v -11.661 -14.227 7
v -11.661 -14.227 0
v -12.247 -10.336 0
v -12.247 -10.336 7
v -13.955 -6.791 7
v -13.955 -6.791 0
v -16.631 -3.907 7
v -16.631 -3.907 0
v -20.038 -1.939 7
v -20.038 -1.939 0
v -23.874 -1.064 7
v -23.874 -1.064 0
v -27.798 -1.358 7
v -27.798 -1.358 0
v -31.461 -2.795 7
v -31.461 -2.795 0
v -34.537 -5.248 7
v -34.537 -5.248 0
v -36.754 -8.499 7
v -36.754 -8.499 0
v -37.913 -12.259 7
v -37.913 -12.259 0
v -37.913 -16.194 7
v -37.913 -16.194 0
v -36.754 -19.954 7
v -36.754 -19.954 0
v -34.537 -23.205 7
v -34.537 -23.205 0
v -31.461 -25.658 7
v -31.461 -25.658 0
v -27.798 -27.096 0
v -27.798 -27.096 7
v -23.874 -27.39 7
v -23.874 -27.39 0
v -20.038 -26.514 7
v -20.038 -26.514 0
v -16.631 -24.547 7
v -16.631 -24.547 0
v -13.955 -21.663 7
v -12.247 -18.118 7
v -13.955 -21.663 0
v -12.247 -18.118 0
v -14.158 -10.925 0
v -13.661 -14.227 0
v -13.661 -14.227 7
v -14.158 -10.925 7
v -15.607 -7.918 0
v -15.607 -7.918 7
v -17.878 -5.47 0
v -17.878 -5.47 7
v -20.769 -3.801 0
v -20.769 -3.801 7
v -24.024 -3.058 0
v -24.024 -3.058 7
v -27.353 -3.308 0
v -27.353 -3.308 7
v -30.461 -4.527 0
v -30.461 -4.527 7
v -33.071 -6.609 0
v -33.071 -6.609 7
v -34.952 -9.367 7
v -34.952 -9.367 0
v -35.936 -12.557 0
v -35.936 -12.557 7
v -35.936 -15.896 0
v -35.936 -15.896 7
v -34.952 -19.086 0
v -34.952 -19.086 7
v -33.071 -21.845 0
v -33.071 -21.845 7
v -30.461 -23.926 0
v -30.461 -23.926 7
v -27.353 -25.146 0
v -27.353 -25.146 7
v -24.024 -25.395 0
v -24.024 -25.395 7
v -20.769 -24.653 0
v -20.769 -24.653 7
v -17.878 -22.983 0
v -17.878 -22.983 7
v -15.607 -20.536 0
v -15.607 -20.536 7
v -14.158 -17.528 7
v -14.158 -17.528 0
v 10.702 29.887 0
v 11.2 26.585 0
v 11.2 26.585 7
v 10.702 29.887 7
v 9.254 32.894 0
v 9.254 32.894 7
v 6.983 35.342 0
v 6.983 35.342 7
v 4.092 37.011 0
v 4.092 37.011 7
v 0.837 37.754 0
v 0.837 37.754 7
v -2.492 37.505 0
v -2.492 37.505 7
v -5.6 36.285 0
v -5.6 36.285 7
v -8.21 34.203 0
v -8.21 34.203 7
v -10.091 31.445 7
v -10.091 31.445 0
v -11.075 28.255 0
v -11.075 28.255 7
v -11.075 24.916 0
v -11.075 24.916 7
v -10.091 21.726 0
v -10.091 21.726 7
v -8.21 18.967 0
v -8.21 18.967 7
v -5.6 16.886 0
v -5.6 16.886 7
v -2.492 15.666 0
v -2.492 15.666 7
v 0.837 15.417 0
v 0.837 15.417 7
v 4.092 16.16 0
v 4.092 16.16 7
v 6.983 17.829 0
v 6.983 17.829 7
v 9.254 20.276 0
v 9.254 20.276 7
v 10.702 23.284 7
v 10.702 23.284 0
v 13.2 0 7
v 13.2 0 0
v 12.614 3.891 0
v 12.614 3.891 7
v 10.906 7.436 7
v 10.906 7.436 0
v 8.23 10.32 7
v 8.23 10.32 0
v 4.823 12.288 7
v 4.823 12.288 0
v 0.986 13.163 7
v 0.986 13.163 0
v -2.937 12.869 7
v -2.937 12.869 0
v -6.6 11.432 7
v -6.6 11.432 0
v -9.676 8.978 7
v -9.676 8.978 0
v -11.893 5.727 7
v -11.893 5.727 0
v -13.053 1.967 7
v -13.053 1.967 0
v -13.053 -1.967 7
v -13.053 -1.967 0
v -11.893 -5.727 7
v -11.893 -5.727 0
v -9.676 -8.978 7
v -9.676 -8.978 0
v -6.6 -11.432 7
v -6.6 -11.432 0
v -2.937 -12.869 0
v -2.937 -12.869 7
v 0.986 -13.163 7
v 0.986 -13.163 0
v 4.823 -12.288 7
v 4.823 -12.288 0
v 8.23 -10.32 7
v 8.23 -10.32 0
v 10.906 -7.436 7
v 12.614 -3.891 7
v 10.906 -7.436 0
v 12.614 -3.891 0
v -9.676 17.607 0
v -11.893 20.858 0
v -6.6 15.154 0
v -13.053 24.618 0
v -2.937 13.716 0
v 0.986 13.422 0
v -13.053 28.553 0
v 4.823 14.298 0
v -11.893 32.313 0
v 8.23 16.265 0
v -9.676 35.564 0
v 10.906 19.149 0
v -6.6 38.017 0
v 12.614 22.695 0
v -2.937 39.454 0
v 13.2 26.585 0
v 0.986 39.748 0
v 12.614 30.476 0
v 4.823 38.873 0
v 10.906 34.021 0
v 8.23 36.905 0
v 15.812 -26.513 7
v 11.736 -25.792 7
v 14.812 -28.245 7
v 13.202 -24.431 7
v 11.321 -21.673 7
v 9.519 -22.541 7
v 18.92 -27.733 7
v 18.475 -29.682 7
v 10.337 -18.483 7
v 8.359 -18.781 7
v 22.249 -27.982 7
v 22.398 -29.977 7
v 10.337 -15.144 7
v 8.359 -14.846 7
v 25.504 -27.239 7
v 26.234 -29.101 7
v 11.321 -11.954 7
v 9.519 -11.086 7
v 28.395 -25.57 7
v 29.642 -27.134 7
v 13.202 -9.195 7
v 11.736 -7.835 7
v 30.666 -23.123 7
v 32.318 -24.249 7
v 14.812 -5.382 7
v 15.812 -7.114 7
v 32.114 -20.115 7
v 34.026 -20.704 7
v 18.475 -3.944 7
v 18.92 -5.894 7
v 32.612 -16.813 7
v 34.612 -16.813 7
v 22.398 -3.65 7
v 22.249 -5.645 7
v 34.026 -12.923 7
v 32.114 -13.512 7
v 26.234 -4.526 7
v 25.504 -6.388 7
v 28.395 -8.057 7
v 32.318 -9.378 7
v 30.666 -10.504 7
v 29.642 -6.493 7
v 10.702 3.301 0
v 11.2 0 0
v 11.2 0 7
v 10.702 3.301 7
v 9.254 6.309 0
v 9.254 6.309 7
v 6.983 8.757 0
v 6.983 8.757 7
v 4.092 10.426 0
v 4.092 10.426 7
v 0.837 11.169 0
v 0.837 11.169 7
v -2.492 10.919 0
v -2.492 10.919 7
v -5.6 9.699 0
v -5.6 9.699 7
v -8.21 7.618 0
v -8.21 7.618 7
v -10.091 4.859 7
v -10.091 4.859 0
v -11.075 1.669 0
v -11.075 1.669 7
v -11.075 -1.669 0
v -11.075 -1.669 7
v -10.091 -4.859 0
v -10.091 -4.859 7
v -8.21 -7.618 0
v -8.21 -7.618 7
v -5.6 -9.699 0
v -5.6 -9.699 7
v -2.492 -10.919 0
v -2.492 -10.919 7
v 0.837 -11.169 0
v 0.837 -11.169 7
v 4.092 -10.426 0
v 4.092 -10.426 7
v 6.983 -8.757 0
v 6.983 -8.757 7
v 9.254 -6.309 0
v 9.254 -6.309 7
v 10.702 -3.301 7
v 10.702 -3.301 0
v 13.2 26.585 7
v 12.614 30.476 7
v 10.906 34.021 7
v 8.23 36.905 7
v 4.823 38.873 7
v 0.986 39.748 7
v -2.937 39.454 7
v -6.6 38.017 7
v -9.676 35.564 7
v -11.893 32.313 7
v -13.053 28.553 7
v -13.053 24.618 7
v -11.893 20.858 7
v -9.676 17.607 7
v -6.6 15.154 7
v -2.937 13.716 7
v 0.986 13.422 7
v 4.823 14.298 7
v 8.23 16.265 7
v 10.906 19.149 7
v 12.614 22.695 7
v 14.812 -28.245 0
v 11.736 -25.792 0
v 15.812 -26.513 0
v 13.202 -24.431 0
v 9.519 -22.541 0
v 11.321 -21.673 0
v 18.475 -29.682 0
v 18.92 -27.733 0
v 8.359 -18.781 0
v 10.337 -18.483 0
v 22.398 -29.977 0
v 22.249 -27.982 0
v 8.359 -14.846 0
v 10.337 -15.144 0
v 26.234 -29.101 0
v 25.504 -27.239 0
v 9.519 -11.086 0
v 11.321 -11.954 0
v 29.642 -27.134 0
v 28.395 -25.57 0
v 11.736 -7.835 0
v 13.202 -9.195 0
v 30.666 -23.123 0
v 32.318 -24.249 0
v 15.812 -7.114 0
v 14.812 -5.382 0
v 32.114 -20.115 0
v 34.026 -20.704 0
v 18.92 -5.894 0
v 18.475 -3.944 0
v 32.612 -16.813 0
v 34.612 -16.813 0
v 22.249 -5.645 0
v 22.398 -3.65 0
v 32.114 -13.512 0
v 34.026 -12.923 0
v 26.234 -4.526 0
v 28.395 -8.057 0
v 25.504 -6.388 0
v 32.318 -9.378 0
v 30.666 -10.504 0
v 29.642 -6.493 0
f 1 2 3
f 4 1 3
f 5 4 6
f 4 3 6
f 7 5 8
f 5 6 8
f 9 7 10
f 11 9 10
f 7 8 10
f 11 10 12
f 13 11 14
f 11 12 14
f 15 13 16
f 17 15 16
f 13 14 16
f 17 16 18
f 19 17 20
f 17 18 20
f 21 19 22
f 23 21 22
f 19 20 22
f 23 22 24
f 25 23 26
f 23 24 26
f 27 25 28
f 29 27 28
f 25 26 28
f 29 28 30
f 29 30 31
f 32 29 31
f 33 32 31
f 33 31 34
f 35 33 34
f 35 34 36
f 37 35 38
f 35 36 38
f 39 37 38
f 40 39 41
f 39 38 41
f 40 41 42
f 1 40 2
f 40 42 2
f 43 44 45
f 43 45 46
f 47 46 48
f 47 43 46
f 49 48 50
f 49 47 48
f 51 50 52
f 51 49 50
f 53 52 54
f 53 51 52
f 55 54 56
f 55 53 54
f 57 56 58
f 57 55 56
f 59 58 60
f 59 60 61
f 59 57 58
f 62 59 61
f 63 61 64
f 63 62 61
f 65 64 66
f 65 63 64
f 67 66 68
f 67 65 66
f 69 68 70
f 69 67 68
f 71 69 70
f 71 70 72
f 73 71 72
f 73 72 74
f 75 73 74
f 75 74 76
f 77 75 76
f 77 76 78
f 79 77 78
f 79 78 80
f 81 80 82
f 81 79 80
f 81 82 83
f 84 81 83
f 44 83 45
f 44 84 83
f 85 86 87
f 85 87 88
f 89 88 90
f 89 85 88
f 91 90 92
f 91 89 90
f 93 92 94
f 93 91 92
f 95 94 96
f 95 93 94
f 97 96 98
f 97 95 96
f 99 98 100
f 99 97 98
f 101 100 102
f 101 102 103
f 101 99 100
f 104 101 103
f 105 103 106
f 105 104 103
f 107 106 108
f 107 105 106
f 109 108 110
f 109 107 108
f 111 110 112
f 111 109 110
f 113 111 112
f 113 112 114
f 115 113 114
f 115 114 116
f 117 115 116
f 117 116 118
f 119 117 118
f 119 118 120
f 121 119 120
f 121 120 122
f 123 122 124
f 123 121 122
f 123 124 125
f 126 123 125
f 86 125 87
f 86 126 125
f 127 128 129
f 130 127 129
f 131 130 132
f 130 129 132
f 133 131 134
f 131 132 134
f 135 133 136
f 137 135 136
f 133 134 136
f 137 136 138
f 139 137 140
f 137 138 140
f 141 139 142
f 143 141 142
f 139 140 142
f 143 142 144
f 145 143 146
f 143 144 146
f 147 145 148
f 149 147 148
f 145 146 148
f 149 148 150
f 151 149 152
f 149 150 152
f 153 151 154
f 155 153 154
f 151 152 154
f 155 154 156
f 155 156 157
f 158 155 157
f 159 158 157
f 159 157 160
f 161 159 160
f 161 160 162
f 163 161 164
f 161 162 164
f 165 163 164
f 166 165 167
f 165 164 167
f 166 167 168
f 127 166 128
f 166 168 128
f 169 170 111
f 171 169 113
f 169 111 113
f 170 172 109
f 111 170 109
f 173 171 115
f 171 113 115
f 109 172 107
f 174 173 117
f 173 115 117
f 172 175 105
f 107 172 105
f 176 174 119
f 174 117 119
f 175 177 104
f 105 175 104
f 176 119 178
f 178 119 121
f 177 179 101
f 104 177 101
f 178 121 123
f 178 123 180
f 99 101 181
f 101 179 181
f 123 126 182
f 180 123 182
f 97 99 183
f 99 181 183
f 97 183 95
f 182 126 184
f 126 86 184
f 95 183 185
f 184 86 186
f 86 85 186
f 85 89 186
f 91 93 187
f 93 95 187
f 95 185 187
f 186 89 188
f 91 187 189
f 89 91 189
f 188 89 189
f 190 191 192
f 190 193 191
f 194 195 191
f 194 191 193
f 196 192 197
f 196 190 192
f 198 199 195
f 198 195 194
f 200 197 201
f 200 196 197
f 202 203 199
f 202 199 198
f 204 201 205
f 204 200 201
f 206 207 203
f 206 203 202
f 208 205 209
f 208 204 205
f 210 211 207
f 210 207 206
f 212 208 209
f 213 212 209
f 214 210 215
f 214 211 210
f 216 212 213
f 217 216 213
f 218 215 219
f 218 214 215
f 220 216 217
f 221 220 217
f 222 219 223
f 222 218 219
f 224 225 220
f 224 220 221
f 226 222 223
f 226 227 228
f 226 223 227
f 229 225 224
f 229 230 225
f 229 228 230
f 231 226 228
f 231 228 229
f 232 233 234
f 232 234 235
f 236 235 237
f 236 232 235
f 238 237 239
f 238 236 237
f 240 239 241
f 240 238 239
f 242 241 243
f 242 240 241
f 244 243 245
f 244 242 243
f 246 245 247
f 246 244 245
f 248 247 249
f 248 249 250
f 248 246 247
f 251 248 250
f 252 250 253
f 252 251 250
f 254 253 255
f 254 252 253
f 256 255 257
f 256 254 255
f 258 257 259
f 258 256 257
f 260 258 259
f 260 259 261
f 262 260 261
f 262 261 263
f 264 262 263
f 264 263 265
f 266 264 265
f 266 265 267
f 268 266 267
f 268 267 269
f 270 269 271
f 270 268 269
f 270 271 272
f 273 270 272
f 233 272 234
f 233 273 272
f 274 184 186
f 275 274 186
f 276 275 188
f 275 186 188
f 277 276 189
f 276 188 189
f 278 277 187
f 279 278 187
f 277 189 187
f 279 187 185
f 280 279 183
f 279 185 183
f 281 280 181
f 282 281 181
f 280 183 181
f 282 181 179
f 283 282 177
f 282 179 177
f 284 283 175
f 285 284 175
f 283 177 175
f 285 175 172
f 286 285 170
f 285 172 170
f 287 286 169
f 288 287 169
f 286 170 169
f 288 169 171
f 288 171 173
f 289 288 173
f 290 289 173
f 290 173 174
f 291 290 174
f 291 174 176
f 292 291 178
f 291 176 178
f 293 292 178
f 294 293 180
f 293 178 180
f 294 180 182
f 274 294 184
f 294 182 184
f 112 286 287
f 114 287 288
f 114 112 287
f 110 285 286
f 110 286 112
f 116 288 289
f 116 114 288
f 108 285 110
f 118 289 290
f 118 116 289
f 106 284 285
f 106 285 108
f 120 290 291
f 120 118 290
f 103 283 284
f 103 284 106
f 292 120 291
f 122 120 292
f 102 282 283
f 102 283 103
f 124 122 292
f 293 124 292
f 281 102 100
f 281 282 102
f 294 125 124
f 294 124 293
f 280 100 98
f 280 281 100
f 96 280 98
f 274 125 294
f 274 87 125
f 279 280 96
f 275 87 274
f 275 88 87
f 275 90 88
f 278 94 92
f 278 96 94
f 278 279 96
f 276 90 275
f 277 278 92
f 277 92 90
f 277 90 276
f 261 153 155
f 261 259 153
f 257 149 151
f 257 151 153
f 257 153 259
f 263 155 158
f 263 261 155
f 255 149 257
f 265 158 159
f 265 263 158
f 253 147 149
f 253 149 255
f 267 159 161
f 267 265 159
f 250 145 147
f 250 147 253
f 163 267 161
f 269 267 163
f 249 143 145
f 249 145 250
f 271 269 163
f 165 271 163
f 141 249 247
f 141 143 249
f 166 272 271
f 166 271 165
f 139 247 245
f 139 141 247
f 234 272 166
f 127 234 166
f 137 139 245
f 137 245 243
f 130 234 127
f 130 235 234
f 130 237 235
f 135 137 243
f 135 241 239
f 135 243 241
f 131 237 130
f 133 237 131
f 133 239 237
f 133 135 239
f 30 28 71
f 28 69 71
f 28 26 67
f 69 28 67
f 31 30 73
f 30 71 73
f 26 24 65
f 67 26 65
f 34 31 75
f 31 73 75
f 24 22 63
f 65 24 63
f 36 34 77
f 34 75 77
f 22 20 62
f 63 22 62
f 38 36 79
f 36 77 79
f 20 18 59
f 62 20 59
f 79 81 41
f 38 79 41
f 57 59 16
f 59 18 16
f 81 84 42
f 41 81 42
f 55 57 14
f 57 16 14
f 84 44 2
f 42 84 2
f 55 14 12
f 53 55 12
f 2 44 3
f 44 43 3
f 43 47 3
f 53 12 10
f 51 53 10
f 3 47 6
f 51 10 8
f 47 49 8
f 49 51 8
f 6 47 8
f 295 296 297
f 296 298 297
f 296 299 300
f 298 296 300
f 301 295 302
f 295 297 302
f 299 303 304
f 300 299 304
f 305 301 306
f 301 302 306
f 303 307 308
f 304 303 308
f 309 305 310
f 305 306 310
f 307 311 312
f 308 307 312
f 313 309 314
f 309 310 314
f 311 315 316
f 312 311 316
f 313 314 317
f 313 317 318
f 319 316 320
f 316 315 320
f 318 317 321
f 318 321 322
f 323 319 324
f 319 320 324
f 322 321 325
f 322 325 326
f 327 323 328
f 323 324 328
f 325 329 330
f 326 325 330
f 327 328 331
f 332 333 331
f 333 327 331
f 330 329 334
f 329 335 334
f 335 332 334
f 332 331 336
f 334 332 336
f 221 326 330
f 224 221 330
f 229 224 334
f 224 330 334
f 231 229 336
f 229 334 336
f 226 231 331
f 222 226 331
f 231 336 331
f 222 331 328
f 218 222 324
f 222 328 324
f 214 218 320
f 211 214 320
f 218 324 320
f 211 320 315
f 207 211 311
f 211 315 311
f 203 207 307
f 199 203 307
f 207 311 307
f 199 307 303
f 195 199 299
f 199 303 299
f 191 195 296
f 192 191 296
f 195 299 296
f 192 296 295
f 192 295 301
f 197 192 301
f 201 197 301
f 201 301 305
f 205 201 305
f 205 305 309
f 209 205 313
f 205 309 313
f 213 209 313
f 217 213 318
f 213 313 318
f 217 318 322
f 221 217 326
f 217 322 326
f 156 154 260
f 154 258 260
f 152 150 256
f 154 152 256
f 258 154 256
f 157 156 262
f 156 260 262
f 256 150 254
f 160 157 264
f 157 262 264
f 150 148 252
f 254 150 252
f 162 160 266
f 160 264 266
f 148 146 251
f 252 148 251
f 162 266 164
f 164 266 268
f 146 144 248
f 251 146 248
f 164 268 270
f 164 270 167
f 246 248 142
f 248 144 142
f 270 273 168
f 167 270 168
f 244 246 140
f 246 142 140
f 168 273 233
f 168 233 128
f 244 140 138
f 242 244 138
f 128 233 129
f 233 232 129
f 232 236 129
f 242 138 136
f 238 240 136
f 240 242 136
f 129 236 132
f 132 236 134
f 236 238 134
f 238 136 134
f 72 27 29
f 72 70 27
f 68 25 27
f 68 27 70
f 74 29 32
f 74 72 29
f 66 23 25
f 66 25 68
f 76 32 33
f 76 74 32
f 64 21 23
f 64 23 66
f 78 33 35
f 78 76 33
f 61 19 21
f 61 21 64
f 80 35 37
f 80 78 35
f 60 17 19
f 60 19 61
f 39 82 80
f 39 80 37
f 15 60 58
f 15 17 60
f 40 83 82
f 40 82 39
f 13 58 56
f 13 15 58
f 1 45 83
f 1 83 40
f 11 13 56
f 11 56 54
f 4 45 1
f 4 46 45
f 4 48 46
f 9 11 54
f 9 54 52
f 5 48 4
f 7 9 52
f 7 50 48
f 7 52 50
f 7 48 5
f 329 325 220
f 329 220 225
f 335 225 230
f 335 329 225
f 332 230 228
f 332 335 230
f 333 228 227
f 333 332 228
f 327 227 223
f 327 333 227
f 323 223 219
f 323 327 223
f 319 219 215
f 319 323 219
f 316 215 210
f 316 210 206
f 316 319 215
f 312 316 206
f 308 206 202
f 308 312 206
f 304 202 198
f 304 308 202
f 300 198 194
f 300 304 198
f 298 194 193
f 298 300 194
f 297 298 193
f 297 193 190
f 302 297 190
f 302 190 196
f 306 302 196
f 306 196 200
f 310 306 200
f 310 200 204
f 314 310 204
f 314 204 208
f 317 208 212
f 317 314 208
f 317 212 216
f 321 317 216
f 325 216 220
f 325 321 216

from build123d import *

# Parameters (mm, degrees)
F0_R     = 13.2
F0_R_2   = 11.2
F1_DEPTH = 7


with BuildPart() as f1:
    # F0 (on Top) → F1 (new body)
    with BuildSketch(Plane.XY):
        Circle(F0_R)
        Circle(F0_R_2, mode=Mode.SUBTRACT)
        with Locations((-24.860859, -14.226735)):
            Circle(F0_R)
        with Locations((-24.860859, -14.226735)):
            Circle(F0_R_2, mode=Mode.SUBTRACT)
        with Locations((21.411952, -16.813412)):
            Circle(F0_R)
        with Locations((21.411952, -16.813412)):
            Circle(F0_R_2, mode=Mode.SUBTRACT)
        with Locations((0, 26.585311)):
            Circle(F0_R)
        with Locations((0, 26.585311)):
            Circle(F0_R_2, mode=Mode.SUBTRACT)
    extrude(amount=F1_DEPTH)


solid = f1.part
